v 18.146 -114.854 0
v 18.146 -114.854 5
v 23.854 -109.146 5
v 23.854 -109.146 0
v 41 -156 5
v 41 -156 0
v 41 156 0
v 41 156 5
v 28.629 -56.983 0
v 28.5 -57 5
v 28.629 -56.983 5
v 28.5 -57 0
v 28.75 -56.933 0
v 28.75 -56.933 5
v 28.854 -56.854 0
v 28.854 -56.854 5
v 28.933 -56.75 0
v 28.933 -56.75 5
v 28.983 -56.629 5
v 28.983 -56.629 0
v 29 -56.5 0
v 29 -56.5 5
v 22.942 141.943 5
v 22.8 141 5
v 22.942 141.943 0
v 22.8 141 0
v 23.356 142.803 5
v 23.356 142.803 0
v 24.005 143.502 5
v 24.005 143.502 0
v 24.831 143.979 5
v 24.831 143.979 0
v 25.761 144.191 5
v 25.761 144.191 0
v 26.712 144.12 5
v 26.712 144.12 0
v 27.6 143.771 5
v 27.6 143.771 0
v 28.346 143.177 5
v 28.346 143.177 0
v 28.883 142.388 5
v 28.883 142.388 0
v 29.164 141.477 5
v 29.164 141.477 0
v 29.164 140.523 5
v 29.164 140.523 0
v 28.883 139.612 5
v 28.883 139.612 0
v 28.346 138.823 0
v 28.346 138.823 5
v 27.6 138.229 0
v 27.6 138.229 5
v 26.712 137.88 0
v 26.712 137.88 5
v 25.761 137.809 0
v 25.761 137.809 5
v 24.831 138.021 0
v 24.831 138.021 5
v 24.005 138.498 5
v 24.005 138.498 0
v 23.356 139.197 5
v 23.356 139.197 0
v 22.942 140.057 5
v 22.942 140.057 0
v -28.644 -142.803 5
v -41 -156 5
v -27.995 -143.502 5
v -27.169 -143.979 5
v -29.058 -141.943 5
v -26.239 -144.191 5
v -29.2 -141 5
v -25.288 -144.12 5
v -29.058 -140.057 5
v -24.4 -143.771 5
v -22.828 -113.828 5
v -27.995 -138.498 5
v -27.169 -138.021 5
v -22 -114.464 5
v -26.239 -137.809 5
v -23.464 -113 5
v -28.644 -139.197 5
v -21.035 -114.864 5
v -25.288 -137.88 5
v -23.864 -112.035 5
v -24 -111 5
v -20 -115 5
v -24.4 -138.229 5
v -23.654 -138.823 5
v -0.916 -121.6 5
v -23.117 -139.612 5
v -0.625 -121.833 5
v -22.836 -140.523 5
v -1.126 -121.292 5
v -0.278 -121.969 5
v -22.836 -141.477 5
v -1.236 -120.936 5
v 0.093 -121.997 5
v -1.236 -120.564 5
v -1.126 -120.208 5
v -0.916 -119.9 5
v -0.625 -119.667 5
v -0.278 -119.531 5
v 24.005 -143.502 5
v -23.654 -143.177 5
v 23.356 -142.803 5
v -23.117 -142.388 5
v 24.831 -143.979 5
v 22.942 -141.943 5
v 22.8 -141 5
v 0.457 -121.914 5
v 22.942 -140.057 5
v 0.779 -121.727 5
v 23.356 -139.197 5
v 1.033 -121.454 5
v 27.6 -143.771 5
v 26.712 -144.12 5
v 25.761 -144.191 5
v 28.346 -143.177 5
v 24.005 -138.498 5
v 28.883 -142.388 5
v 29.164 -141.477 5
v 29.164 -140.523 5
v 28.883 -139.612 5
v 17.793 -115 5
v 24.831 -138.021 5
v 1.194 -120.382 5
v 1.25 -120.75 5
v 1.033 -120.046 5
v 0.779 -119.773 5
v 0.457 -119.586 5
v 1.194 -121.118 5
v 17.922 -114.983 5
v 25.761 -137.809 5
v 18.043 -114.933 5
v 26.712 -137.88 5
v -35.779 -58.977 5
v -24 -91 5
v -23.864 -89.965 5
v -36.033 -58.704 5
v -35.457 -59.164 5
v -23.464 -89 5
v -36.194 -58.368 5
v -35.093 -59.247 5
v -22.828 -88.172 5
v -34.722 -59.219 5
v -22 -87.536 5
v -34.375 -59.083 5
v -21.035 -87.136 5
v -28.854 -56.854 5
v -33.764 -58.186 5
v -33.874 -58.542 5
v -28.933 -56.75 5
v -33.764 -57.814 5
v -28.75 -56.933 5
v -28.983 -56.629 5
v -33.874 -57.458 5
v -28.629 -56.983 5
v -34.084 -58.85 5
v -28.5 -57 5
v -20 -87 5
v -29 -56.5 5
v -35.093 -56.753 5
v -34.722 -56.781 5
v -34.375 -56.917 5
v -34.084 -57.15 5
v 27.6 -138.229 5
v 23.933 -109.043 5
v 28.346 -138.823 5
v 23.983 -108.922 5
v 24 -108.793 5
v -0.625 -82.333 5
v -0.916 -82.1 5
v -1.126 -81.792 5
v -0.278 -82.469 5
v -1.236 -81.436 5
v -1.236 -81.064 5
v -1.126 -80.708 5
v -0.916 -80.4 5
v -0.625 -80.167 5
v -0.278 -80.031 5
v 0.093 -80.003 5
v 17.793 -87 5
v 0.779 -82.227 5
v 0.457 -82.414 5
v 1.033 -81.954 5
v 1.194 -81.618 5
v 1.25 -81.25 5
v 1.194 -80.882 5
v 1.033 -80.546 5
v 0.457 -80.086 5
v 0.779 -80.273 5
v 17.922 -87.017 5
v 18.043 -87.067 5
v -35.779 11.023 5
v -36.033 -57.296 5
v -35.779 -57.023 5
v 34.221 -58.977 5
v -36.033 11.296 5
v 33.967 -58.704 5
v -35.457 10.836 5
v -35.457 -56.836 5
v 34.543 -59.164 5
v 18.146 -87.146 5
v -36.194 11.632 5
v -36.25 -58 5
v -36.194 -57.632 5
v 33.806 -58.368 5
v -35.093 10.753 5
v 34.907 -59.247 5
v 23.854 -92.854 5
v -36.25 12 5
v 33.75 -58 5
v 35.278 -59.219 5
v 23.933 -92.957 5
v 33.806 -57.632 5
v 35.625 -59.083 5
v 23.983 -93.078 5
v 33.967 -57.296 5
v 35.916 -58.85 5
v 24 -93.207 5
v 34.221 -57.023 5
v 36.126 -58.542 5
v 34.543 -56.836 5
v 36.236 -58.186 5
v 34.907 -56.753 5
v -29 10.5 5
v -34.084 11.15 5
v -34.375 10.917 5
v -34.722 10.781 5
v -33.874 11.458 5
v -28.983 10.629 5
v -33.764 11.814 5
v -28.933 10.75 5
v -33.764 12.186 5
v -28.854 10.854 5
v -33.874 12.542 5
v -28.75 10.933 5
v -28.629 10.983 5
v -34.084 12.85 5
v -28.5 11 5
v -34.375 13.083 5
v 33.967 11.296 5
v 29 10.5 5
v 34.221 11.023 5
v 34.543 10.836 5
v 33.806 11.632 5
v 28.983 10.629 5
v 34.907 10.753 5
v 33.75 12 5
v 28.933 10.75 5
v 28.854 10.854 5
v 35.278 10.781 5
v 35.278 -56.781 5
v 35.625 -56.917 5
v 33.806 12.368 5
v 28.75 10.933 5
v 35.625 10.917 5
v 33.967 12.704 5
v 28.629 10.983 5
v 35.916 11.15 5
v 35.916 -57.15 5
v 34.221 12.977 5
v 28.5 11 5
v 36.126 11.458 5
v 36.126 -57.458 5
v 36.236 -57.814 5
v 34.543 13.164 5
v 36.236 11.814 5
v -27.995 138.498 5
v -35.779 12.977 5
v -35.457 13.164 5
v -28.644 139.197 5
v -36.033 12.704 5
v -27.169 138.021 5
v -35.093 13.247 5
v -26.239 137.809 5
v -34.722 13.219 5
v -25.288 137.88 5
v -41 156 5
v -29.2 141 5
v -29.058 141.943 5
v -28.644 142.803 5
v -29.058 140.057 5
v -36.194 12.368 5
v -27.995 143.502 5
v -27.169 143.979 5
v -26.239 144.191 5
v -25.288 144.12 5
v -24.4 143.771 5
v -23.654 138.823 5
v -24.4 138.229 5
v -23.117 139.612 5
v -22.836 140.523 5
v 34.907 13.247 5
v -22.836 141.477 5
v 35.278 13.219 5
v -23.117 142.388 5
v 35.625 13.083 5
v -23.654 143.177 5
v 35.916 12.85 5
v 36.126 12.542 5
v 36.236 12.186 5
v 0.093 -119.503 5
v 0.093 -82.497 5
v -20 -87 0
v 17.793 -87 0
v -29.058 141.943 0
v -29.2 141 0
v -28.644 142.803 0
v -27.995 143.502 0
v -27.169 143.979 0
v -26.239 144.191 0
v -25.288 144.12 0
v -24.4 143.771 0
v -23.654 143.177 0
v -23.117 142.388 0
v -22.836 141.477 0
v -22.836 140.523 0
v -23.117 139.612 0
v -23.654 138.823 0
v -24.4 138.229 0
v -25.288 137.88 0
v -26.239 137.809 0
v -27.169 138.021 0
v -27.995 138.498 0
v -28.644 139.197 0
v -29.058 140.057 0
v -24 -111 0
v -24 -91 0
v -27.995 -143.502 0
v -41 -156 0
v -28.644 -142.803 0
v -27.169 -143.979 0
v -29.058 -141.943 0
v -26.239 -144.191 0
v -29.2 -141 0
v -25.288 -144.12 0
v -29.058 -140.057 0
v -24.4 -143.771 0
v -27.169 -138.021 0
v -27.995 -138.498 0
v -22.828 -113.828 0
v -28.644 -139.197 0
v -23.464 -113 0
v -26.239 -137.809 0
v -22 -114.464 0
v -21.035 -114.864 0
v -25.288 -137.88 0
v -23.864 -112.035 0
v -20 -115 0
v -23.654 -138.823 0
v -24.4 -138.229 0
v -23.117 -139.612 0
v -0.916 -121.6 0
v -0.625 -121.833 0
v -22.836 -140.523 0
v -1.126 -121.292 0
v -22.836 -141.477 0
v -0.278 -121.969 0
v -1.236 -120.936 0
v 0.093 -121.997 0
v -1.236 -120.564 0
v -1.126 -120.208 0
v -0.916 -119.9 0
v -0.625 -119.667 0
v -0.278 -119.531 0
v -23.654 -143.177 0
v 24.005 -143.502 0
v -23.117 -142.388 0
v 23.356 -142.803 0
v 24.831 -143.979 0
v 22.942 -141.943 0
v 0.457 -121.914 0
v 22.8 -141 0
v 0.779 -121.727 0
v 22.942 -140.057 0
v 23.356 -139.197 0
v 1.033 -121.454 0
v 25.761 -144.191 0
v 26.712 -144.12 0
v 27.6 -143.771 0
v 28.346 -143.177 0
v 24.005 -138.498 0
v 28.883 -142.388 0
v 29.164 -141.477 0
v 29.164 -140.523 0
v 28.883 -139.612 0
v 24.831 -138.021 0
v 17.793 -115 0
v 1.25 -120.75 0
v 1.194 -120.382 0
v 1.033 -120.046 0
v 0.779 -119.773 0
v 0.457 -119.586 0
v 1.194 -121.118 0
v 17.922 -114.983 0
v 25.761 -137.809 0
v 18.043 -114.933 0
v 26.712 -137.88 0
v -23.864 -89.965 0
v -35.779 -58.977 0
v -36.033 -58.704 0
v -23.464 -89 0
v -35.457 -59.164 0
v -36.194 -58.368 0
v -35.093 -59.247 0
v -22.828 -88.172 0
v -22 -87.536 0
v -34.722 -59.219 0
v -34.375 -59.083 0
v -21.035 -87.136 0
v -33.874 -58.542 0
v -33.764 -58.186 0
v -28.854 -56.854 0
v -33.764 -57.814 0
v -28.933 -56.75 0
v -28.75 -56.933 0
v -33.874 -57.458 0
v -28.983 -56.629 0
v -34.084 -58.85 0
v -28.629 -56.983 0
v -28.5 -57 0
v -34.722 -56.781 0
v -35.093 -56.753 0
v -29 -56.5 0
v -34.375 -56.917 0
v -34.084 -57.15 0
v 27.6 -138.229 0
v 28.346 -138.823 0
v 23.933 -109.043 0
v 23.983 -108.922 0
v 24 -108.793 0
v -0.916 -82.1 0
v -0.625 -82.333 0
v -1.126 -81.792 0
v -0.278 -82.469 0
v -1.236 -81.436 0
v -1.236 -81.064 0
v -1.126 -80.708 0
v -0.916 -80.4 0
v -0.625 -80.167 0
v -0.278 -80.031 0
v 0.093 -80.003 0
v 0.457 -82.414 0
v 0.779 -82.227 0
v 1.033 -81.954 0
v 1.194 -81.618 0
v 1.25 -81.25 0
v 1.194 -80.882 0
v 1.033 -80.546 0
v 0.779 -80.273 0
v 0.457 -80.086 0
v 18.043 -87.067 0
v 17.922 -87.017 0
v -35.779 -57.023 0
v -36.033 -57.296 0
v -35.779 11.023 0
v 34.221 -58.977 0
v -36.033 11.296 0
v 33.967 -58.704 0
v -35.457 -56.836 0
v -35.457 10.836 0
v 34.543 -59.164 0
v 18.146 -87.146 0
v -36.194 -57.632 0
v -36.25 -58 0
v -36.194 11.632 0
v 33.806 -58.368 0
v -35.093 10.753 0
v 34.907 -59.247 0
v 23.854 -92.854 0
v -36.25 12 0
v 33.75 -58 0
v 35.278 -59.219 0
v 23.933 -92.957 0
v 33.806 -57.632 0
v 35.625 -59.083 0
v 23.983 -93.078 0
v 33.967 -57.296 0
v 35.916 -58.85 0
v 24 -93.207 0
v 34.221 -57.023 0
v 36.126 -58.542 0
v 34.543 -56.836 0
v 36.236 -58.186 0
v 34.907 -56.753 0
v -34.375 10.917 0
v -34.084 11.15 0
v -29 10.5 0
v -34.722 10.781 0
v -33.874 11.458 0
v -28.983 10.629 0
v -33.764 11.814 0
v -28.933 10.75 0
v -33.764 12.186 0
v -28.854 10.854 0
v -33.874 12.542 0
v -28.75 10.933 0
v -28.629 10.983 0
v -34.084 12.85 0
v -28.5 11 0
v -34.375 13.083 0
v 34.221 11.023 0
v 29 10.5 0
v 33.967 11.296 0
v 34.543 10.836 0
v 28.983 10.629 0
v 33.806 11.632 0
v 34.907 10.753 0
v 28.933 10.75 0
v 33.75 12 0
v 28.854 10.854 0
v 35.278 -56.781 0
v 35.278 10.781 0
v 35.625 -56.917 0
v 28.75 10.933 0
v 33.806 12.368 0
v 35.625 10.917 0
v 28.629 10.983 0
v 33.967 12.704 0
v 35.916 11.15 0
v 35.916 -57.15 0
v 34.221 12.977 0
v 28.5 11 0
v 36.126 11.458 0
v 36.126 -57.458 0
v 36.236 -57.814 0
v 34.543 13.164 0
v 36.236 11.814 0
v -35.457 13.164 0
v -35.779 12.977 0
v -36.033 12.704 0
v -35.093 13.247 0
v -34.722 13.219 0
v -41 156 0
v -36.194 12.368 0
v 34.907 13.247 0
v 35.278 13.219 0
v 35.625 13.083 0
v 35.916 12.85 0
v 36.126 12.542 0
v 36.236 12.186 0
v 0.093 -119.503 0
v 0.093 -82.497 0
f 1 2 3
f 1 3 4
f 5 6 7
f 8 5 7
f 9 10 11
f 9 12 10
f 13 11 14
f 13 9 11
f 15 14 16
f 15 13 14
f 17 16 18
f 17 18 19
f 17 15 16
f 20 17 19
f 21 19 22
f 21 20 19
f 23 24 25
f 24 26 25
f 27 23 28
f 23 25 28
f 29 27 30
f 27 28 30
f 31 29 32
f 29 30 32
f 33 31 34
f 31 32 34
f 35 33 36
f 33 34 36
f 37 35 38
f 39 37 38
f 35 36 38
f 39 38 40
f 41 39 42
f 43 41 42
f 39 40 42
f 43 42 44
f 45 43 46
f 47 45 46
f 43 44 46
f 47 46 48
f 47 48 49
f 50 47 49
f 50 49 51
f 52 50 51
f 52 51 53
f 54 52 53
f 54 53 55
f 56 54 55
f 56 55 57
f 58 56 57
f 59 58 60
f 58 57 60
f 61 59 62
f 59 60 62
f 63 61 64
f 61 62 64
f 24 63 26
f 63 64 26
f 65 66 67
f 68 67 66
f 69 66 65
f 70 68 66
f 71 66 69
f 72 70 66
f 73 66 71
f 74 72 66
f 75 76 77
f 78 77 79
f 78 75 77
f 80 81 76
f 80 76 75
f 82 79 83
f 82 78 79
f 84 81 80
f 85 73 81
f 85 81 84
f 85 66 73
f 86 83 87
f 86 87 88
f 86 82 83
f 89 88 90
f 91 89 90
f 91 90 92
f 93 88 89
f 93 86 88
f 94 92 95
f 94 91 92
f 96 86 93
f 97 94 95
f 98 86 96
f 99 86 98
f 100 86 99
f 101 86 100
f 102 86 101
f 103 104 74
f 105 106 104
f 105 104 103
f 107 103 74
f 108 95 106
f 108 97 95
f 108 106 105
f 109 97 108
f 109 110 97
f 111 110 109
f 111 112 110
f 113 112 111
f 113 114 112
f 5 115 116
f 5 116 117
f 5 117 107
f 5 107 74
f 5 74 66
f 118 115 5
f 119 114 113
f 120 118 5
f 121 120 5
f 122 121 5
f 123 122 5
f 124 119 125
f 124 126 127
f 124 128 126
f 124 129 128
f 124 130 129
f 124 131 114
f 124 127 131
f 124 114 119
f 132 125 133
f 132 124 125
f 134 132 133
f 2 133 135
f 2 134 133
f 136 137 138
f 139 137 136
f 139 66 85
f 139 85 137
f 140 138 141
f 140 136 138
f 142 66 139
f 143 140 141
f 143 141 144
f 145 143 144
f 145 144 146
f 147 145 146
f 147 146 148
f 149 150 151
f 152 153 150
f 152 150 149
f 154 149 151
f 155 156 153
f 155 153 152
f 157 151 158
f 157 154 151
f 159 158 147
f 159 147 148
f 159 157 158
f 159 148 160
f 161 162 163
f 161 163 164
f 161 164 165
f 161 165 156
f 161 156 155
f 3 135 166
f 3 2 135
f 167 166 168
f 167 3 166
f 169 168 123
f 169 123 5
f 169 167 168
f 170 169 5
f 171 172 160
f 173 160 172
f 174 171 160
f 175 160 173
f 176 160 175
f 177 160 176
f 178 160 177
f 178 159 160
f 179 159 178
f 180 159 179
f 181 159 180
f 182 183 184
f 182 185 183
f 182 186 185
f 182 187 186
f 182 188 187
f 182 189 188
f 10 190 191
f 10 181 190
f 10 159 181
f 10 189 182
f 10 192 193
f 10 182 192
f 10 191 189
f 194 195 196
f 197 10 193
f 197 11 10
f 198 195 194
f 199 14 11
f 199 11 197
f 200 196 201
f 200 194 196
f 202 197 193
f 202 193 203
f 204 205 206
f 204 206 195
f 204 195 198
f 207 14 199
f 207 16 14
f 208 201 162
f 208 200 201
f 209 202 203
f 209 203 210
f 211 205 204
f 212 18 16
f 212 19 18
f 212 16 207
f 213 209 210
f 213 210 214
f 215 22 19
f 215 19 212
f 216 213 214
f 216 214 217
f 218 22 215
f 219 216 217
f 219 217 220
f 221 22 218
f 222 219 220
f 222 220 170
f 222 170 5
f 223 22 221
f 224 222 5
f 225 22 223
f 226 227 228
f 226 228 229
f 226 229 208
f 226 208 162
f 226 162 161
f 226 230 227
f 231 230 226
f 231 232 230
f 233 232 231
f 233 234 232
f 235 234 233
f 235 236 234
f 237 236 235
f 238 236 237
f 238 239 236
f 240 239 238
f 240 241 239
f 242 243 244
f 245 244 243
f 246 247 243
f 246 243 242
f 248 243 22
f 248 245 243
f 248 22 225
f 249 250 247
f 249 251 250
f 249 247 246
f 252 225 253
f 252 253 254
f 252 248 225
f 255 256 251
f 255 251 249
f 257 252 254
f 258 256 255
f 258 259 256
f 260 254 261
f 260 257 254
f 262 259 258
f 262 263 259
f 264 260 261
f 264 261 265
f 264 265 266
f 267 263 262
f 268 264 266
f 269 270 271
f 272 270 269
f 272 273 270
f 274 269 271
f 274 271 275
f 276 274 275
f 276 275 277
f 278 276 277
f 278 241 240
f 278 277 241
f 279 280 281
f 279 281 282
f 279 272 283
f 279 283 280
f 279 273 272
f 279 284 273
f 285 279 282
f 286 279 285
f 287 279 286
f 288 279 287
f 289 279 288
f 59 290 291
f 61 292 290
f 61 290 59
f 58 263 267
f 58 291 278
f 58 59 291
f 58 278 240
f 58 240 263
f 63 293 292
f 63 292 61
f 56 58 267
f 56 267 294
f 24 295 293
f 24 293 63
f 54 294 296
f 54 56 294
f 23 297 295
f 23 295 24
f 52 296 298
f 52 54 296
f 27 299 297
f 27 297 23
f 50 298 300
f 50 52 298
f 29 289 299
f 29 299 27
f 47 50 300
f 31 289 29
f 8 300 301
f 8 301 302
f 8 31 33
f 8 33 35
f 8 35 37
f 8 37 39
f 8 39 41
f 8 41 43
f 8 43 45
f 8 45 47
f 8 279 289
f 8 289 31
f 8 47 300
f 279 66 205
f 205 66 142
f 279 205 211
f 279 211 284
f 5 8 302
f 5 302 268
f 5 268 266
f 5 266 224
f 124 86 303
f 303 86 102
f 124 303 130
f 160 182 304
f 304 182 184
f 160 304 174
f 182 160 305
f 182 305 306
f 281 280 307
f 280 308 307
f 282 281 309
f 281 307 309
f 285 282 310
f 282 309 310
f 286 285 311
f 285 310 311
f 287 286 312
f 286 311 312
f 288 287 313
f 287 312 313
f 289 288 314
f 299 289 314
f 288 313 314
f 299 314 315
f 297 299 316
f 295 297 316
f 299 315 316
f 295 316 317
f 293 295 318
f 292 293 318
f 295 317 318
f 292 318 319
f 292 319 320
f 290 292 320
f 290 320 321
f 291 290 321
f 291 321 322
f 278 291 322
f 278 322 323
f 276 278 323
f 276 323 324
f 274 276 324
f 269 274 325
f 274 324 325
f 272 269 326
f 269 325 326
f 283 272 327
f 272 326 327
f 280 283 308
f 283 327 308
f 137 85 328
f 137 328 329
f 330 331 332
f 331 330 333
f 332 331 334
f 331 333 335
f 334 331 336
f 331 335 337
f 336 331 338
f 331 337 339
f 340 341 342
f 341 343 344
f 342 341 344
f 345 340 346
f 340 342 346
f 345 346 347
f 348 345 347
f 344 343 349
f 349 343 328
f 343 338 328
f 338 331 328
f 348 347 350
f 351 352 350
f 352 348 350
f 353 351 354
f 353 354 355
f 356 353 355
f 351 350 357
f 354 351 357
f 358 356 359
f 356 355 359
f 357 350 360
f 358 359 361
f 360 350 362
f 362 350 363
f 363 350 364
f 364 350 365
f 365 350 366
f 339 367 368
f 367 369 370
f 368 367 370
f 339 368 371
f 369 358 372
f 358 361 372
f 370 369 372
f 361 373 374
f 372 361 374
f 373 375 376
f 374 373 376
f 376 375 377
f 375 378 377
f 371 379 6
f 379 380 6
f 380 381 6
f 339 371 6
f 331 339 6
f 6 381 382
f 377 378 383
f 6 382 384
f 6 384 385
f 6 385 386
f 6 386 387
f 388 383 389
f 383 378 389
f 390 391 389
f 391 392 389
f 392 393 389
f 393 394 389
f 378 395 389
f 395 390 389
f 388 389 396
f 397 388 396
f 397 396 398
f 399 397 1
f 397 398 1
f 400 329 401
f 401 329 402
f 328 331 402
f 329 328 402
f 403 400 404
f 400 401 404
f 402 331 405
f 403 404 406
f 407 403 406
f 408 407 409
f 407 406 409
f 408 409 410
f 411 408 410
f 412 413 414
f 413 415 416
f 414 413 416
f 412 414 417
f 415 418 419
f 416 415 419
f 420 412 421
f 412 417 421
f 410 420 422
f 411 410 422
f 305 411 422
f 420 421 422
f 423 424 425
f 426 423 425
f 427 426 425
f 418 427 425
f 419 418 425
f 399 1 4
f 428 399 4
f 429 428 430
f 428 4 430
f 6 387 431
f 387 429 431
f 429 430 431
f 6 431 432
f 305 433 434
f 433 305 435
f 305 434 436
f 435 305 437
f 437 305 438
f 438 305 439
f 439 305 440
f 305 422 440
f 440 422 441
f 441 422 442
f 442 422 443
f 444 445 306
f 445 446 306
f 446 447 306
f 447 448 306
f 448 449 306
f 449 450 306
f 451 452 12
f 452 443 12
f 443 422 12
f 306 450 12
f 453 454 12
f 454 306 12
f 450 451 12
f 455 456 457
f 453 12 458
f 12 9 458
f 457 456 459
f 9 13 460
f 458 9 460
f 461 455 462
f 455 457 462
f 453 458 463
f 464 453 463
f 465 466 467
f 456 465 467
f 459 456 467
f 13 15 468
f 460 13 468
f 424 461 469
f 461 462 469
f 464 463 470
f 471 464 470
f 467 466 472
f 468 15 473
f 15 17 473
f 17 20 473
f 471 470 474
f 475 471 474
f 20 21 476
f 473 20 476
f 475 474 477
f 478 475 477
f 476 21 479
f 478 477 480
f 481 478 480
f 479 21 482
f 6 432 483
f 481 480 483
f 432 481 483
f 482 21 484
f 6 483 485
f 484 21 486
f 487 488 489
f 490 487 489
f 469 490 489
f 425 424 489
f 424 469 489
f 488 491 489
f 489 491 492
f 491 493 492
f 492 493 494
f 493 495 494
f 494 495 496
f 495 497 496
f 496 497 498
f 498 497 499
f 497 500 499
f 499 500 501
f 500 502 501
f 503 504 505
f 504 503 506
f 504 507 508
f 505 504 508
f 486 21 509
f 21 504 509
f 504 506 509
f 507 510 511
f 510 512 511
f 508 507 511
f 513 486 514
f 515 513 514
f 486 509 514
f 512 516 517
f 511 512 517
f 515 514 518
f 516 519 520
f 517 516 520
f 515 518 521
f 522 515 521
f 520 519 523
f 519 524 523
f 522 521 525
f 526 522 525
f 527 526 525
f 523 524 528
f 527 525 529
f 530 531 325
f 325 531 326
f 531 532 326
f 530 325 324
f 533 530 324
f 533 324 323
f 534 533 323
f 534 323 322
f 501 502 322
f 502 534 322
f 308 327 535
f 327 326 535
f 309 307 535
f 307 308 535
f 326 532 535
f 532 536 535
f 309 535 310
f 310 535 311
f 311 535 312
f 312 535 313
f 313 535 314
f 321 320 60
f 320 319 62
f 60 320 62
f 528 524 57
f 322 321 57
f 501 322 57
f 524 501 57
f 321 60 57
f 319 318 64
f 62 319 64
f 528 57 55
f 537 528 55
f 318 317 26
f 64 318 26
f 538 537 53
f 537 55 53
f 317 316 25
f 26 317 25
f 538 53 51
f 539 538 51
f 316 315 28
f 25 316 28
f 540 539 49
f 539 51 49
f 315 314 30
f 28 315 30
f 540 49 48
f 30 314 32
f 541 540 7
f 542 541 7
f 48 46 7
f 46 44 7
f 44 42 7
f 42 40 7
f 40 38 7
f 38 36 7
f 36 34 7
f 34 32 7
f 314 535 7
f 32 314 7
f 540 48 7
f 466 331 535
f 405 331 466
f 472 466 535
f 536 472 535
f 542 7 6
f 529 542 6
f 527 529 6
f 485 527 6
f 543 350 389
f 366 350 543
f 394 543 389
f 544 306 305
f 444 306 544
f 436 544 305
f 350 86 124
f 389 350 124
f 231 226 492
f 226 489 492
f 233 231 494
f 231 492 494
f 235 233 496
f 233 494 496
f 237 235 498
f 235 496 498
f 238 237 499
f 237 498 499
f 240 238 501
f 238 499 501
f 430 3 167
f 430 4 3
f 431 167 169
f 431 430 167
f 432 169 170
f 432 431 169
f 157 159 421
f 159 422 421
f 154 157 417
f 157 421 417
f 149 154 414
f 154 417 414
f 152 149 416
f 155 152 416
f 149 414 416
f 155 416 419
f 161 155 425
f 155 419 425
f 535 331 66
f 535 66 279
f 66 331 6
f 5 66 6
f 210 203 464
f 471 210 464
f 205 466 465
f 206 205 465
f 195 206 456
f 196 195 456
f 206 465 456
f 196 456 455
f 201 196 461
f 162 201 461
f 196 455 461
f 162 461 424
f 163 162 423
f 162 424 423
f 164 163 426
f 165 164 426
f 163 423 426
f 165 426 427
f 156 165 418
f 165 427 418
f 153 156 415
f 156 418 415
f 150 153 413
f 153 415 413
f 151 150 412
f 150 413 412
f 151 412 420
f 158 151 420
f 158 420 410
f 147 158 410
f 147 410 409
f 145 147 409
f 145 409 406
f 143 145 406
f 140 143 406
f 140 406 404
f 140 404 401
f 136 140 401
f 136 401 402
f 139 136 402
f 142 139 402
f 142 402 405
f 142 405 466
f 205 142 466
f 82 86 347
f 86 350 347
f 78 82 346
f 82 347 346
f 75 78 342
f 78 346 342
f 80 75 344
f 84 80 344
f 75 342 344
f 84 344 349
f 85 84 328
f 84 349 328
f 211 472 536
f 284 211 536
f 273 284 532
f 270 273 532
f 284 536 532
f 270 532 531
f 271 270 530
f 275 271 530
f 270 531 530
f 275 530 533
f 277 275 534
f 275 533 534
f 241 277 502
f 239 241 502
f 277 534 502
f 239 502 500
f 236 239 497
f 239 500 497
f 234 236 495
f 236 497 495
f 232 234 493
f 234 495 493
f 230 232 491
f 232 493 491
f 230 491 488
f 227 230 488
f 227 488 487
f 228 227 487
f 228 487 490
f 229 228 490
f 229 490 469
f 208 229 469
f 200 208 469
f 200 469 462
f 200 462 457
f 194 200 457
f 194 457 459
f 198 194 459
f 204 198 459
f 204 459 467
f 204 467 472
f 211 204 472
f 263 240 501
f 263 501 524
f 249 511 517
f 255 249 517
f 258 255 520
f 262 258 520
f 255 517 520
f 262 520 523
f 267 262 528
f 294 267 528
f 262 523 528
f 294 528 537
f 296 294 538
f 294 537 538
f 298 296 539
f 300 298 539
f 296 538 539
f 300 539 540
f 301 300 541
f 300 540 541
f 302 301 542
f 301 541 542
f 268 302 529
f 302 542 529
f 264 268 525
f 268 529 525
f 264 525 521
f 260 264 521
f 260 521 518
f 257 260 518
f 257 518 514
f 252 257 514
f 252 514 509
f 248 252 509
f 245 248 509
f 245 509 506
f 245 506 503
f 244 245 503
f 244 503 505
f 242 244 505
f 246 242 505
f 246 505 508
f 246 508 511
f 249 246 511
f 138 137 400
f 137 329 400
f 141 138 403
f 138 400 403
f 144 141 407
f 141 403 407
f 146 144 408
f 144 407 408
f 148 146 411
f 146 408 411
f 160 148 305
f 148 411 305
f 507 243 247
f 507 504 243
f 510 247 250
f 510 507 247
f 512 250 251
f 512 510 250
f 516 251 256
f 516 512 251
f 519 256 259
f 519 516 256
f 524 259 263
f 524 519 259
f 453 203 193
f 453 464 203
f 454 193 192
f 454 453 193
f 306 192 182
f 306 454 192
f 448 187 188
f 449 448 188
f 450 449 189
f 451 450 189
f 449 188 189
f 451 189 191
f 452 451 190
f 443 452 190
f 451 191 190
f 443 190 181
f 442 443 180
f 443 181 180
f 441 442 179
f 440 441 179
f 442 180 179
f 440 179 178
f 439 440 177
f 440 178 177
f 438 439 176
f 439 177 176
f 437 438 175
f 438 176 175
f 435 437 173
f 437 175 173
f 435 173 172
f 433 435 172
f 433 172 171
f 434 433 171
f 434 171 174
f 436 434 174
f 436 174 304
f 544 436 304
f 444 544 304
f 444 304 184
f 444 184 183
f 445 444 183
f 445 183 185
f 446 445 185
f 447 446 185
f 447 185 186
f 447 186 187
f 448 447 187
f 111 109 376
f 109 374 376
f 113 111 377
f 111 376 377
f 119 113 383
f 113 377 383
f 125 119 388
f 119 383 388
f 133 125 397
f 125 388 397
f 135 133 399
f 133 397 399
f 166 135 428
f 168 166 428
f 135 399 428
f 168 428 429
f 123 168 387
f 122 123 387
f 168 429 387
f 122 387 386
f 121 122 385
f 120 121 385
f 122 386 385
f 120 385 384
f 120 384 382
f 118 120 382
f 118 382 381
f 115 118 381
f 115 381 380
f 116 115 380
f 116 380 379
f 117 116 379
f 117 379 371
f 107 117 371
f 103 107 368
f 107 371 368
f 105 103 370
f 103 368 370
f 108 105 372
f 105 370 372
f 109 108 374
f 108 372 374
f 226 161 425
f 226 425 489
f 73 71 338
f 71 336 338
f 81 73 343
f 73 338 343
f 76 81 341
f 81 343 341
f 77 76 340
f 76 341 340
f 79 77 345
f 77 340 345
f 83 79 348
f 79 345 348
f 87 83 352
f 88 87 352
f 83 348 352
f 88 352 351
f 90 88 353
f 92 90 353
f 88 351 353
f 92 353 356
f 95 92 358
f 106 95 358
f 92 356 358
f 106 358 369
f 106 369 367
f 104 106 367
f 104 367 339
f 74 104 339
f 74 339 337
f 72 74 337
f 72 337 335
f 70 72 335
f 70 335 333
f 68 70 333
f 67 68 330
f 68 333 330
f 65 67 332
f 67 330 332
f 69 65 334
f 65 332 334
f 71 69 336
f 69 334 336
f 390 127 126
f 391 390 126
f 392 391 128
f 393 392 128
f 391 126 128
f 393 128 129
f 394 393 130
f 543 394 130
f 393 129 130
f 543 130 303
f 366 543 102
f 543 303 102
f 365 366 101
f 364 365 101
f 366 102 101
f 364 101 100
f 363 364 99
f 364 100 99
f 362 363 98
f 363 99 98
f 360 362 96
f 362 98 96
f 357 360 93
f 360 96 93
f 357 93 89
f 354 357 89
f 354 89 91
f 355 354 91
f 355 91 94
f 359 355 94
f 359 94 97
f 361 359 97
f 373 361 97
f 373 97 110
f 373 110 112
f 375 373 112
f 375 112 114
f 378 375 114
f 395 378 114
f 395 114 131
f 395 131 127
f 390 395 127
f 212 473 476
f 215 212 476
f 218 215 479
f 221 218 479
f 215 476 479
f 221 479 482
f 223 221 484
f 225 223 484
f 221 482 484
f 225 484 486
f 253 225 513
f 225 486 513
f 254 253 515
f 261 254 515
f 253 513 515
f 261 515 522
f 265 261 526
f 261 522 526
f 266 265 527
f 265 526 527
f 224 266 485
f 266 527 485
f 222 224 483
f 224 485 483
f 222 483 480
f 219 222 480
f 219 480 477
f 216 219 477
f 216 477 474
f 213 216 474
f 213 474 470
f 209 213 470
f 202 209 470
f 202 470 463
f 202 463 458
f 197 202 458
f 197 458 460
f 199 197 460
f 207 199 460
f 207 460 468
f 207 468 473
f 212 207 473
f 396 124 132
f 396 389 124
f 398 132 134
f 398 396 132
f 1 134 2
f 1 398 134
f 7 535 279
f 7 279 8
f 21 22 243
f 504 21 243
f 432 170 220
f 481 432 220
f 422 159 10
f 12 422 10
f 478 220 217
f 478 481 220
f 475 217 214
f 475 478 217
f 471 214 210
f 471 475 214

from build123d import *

# Parameters (mm, degrees)
SKETCH1_W                = 82
SKETCH1_H                = 312
BOSS_EXTRUDE1_DEPTH      = 5
SKETCH2_R                = 1.25
SKETCH2_W                = 48
SKETCH2_H                = 28
CUT_EXTRUDE1_DEPTH       = 10
CHAMFER1_SIZE            = 6
FILLET1_R                = 4
SKETCH3_W                = 58
SKETCH3_H                = 68
CUT_EXTRUDE2_DEPTH       = 6
M3X0_5_TAPPED_HOLE1_D    = 2.5
FILLET2_R                = 0.5
M6_CLEARANCE_HOLE1_D     = 6.4
M6_CLEARANCE_HOLE1_DEPTH = 5
M6_CLEARANCE_HOLE1_TIP   = 1.922753981


with BuildPart() as part:
    # Sketch1 → Boss-Extrude1 (new body)
    with BuildSketch(Plane.XY):
        Rectangle(SKETCH1_W, SKETCH1_H)
    extrude(amount=BOSS_EXTRUDE1_DEPTH)

    # Sketch2 → Cut-Extrude1 (cut)
    with BuildSketch(Plane.XY.offset(5)):
        with Locations((0, -81.25)):
            Circle(SKETCH2_R)
        with Locations((0, -120.75)):
            Circle(SKETCH2_R)
        with Locations((0, -101)):
            Rectangle(SKETCH2_W, SKETCH2_H)
    extrude(amount=-CUT_EXTRUDE1_DEPTH, mode=Mode.SUBTRACT)

    # Chamfer1
    chamfer1_edges = [part.edges().sort_by_distance(p)[0] for p in [
        (24, -87, 2.5),
        (24, -115, 2.5),
    ]]
    chamfer(chamfer1_edges, length=CHAMFER1_SIZE)

    # Fillet1
    fillet1_edges = [part.edges().sort_by_distance(p)[0] for p in [
        (-24, -115, 2.5),
        (-24, -87, 2.5),
    ]]
    fillet(fillet1_edges, radius=FILLET1_R)

    # Sketch3 → Cut-Extrude2 (cut, through all)
    with BuildSketch(Plane.XY.offset(5)):
        with Locations((0, -23)):
            Rectangle(SKETCH3_W, SKETCH3_H)
    extrude(amount=-CUT_EXTRUDE2_DEPTH, mode=Mode.SUBTRACT)

    # M3x0.5 Tapped Hole1 (through all)
    with Locations(Plane.XY.offset(5)):
        with Locations((-35, 12), (35, 12), (35, -58), (-35, -58)):
            Hole(M3X0_5_TAPPED_HOLE1_D / 2)

    # Fillet2
    fillet2_edges = [part.edges().sort_by_distance(p)[0] for p in [
        (24, -93, 2.5),
        (24, -109, 2.5),
        (18, -115, 2.5),
        (18, -87, 2.5),
        (29, 11, 2.5),
        (29, -57, 2.5),
        (-29, -57, 2.5),
        (-29, 11, 2.5),
    ]]
    fillet(fillet2_edges, radius=FILLET2_R)

    # M6 Clearance Hole1
    with Locations(Plane.XY.offset(5)):
        with Locations((-26, 141), (26, 141), (-26, -141), (26, -141)):
            Hole(M6_CLEARANCE_HOLE1_D / 2, depth=M6_CLEARANCE_HOLE1_DEPTH)
            with Locations((0, 0, -(M6_CLEARANCE_HOLE1_DEPTH + M6_CLEARANCE_HOLE1_TIP / 2))):  # 118° drill point
                Cone(0, M6_CLEARANCE_HOLE1_D / 2, M6_CLEARANCE_HOLE1_TIP, mode=Mode.SUBTRACT)


solid = part.part
